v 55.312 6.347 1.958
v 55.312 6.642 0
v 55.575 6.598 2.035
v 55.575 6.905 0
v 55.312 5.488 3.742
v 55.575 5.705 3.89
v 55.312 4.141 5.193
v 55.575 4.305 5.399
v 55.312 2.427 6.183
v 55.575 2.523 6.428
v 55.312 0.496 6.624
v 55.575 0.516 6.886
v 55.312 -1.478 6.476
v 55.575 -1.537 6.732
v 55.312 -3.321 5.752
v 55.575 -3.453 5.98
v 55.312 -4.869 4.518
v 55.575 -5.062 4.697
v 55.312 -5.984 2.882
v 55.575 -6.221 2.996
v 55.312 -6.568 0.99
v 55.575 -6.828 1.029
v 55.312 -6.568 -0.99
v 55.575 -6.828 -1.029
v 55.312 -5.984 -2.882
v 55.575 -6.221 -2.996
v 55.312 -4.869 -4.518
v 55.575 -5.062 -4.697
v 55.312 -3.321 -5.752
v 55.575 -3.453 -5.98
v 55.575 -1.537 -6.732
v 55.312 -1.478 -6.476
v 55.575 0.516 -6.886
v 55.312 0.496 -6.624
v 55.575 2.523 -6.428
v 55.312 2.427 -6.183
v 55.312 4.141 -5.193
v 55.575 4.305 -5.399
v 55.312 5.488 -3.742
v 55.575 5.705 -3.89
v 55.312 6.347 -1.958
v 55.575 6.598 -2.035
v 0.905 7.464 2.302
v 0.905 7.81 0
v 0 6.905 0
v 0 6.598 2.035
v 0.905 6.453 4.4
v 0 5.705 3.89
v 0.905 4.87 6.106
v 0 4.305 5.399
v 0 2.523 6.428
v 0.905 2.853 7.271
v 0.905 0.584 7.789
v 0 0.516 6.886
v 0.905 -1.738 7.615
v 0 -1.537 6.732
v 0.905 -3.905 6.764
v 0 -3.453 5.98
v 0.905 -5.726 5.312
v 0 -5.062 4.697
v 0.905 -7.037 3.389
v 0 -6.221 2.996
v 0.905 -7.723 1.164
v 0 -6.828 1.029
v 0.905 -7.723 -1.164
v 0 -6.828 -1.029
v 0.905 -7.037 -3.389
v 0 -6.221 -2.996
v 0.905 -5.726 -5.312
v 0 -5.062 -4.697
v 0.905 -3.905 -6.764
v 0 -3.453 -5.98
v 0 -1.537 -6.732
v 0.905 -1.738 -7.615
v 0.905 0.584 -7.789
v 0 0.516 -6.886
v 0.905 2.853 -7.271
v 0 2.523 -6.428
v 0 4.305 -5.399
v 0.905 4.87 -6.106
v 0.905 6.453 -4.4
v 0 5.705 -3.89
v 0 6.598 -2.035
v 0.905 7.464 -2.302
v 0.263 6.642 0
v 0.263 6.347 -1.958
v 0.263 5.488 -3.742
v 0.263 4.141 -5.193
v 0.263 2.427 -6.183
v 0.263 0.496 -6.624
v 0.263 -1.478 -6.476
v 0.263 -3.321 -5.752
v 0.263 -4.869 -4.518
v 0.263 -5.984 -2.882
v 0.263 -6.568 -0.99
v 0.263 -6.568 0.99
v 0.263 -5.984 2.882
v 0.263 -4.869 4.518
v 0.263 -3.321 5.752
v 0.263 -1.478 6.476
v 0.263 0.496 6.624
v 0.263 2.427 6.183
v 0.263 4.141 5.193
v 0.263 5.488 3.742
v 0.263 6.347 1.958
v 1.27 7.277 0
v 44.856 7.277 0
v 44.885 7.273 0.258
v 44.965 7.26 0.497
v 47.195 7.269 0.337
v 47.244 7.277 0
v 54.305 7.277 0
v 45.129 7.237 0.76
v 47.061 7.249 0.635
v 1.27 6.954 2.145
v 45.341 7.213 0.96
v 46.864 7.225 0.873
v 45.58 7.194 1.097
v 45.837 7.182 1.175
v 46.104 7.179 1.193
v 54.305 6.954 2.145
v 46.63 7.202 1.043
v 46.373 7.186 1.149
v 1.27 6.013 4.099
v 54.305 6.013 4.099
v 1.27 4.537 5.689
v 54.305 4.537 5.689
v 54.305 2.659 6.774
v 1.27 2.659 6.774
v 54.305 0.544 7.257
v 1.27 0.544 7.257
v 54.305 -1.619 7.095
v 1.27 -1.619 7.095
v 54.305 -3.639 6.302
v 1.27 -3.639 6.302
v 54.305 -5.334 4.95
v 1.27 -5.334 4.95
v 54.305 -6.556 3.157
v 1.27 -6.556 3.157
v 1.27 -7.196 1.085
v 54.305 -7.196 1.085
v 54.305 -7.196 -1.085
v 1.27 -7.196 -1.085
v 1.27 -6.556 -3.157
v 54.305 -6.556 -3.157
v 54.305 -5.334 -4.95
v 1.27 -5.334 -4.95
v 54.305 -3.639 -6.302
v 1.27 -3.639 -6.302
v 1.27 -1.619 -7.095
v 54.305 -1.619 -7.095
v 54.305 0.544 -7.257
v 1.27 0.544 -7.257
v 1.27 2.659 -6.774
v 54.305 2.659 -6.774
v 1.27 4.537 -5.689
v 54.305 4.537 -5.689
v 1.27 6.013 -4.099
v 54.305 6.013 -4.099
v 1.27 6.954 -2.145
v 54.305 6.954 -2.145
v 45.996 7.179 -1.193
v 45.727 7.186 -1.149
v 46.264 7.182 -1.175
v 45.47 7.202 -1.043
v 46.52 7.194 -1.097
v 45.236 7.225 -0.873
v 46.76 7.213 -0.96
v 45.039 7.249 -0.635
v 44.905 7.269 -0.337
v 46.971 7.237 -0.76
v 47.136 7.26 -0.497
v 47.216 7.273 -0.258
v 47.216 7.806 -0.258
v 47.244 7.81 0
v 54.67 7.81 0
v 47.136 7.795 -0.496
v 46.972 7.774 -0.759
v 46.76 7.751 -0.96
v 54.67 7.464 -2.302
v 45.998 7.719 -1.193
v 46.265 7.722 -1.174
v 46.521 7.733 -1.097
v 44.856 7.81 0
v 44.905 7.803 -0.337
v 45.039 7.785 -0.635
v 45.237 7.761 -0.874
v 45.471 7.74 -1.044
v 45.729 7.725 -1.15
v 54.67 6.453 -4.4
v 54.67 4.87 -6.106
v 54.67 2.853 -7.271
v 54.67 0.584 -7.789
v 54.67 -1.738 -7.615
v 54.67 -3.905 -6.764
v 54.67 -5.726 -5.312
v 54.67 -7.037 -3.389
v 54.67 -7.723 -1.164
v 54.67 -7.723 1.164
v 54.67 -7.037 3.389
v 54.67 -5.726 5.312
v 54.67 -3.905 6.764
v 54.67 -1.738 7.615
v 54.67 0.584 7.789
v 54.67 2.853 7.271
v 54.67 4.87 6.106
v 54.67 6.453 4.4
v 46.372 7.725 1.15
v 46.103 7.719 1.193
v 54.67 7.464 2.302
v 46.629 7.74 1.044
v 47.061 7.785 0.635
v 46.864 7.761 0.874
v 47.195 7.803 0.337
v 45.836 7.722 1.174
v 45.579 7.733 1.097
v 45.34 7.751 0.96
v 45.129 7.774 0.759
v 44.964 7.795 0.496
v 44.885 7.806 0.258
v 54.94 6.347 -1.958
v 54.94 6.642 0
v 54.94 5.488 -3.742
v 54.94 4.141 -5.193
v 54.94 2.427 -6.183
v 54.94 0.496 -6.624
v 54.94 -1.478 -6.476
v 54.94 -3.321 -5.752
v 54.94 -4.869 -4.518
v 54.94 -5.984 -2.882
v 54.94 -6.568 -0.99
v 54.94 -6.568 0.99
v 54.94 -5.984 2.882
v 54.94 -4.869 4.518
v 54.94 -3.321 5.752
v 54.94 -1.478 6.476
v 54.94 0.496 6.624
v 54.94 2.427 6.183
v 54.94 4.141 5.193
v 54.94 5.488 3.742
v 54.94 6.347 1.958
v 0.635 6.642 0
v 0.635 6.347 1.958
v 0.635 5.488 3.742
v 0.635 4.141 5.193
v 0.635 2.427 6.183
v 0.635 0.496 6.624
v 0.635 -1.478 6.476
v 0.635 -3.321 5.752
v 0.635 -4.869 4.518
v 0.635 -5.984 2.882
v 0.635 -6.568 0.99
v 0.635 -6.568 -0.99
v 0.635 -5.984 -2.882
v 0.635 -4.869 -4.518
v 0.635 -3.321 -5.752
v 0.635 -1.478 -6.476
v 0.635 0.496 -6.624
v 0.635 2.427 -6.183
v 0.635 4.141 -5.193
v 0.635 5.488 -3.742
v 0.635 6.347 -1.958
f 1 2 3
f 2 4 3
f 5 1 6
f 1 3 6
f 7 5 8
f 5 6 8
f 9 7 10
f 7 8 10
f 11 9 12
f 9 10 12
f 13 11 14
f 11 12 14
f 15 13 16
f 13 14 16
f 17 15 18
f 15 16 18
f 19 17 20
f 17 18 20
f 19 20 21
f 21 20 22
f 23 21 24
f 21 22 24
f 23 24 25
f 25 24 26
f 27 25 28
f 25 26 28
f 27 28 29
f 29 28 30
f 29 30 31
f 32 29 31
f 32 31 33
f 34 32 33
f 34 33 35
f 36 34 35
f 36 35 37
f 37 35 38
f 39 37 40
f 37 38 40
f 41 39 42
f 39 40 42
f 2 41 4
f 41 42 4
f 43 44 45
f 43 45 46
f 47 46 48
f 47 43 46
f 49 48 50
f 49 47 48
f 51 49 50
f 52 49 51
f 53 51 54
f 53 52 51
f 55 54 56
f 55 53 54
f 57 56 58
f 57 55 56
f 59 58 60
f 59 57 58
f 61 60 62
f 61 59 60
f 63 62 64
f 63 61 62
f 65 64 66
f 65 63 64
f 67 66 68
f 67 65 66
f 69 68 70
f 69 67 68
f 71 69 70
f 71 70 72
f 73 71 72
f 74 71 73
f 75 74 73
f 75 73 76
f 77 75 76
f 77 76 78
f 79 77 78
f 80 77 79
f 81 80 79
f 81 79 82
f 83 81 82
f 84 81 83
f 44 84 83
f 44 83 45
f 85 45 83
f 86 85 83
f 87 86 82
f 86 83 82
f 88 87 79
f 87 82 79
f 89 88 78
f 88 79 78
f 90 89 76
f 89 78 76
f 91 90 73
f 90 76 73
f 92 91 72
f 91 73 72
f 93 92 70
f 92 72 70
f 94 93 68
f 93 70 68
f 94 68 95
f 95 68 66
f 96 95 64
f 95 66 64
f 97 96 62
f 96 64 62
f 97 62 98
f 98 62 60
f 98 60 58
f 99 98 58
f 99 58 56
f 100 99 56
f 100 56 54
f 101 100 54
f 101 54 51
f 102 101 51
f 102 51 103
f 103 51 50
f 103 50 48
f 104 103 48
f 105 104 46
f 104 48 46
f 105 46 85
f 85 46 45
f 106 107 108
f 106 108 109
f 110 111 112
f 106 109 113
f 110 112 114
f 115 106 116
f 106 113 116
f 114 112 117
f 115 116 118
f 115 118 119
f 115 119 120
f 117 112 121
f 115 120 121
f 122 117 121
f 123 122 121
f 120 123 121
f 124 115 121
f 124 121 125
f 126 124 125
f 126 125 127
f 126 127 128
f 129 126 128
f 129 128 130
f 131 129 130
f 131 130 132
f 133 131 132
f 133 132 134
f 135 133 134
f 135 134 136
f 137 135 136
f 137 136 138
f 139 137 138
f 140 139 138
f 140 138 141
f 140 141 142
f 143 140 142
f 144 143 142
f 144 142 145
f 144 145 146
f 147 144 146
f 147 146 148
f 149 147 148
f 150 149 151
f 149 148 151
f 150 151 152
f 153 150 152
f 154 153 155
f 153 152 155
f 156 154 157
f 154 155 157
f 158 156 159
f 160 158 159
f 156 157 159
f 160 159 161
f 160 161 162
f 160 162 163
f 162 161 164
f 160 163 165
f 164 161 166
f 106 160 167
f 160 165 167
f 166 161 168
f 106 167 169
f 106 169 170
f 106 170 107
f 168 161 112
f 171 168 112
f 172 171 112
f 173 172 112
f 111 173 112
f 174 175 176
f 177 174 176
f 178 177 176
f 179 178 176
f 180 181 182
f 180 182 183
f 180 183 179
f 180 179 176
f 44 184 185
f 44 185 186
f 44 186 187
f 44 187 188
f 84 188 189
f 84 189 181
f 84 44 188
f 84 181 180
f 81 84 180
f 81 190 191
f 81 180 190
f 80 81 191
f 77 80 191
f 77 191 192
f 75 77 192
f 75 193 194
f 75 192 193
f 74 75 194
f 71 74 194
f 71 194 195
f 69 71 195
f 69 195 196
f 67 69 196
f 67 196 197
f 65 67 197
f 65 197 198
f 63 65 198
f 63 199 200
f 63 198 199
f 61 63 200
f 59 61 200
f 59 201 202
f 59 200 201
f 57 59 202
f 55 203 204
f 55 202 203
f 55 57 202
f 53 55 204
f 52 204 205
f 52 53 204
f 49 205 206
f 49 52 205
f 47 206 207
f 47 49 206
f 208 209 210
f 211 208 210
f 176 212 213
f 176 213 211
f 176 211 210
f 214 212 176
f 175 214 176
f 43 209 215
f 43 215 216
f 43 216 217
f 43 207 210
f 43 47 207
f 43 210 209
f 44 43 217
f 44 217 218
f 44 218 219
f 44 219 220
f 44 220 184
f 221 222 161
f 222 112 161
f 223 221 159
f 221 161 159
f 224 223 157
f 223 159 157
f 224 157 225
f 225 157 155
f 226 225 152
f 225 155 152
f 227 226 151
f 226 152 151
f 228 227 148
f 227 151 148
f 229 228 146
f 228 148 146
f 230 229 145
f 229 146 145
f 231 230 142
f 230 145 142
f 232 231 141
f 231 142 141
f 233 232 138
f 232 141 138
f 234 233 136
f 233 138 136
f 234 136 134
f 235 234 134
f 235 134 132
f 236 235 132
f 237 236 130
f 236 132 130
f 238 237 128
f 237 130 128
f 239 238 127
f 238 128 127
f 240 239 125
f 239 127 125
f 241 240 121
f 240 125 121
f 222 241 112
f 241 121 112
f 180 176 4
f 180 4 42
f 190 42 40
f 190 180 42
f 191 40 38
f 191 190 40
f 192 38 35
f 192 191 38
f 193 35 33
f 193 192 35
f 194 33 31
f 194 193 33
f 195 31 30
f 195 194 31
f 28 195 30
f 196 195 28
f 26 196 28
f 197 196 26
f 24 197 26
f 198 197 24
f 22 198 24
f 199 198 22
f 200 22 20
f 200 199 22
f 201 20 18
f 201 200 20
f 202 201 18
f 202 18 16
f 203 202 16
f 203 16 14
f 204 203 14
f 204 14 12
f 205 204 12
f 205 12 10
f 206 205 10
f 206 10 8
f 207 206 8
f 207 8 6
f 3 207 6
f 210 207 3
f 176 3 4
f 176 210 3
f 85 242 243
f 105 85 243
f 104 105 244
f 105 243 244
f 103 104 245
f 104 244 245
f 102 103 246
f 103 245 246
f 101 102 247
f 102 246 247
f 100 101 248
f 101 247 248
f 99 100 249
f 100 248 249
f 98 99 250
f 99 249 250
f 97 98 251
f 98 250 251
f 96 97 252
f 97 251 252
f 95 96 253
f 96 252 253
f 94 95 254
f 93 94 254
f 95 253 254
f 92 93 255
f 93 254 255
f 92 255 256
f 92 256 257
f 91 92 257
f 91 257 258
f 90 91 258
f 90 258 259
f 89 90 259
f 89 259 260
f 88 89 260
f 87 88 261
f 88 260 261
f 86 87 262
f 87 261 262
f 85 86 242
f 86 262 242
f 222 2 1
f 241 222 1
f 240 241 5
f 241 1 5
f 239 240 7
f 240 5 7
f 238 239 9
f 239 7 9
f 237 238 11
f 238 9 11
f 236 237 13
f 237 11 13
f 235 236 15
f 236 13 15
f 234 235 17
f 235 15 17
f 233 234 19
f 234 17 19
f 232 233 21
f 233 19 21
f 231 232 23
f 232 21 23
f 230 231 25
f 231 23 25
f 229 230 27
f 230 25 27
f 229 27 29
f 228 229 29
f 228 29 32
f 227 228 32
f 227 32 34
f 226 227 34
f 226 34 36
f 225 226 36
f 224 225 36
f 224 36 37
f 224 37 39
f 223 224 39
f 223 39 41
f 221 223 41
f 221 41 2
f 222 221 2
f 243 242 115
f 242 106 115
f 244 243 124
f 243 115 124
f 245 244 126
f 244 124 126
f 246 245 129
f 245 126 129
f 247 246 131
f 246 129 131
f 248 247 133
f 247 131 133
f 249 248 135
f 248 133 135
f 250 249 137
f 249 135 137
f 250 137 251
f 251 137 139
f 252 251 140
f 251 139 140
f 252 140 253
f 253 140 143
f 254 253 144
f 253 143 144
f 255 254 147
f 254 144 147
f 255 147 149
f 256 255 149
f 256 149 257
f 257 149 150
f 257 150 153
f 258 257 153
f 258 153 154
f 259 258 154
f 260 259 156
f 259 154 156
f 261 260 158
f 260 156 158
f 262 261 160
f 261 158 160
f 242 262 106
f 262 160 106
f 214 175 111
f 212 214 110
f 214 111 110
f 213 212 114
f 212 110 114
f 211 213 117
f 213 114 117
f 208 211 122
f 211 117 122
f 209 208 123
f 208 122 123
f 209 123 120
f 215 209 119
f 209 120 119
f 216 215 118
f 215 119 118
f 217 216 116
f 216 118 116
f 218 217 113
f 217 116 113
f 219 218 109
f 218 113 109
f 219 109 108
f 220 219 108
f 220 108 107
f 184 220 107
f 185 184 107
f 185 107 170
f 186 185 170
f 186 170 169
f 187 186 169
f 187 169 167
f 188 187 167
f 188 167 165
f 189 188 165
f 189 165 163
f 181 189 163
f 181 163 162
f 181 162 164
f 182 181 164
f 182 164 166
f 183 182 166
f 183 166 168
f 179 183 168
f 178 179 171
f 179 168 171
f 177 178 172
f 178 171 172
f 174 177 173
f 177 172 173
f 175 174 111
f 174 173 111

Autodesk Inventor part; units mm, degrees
sketch "Sketch_5" plane through (0, 0, 0) normal (0, 0, 1) x (1, 0, 0)
  line L0 (55.5752, 0) -> (-55.5752, 0)
  line L1 (0, 6.9051) -> (0.263, 6.6421)
  line L2 (0.263, 6.6421) -> (0.635, 6.6421)
  line L3 (0.635, 6.6421) -> (1.27, 7.2771)
  line L4 (1.27, 7.2771) -> (54.3052, 7.2771)
  line L5 (54.3052, 7.2771) -> (54.9402, 6.6421)
  line L6 (54.9402, 6.6421) -> (55.3122, 6.6421)
  line L7 (55.3122, 6.6421) -> (55.5752, 6.9051)
  line L8 (55.5752, 6.9051) -> (54.6698, 7.8105)
  line L9 (54.6698, 7.8105) -> (0.9054, 7.8105)
  line L10 (0.9054, 7.8105) -> (0, 6.9051)
revolve "Revolution1" add sketch "Sketch_5" angle 360 about axis through (55.5752, 0, 0) along (1, 0, 0)
sketch "Sketch_1" plane through (0, 0, 0) normal (0, 0, 1) x (1, 0, 0)
  line L0 (46.0502, 0) -> (46.0502, 7.8105)
  line L1 (46.0502, 7.8105) -> (47.244, 7.8105)
  line L2 (47.244, 7.8105) -> (47.244, 0)
  line L3 (47.244, 0) -> (46.0502, 0)
  line L4 (46.0502, 0) -> (46.0502, 7.8105)
revolve "Revolution2" cut sketch "Sketch_1" angle 360 about axis through (46.0502, 0, 0) along (0, -1, 0)
ref_plane "o1_XY" through (0, -7.8105, 0) normal (1, 0, 0) x (0, 0, -1)
ref_plane "o1_YZ" through (0, -7.8105, 0) normal (0, 0, -1) x (0, 1, 0)
ref_plane "o1_ZX" through (0, -7.8105, 0) normal (0, 1, 0) x (1, 0, 0)
ref_plane "o2_XY" through (0, 7.8105, 0) normal (1, 0, 0) x (0, 0, -1)
ref_plane "o2_YZ" through (0, 7.8105, 0) normal (0, 0, -1) x (0, 1, 0)
ref_plane "o2_ZX" through (0, 7.8105, 0) normal (0, 1, 0) x (1, 0, 0)
ref_plane "t1_XY" through (27.7876, 7.8105, 0) normal (1, 0, 0) x (0, 0, -1)
ref_plane "t1_YZ" through (27.7876, 7.8105, 0) normal (0, 0, -1) x (0, 1, 0)
ref_plane "t1_ZX" through (27.7876, 7.8105, 0) normal (0, 1, 0) x (1, 0, 0)
ref_plane "t2_XY" through (27.7876, 0, -7.8105) normal (1, 0, 0) x (0, 0, -1)
ref_plane "t2_YZ" through (27.7876, 0, -7.8105) normal (0, 0, -1) x (0, 1, 0)
ref_plane "t2_ZX" through (27.7876, 0, -7.8105) normal (0, 1, 0) x (1, 0, 0)
ref_plane "t3_XY" through (27.7876, -7.8105, 0) normal (1, 0, 0) x (0, 0, -1)
ref_plane "t3_YZ" through (27.7876, -7.8105, 0) normal (0, 0, -1) x (0, 1, 0)
ref_plane "t3_ZX" through (27.7876, -7.8105, 0) normal (0, 1, 0) x (1, 0, 0)
ref_plane "t4_XY" through (27.7876, 0, 7.8105) normal (1, 0, 0) x (0, 0, -1)
ref_plane "t4_YZ" through (27.7876, 0, 7.8105) normal (0, 0, -1) x (0, 1, 0)
ref_plane "t4_ZX" through (27.7876, 0, 7.8105) normal (0, 1, 0) x (1, 0, 0)
ref_plane "tube1_XY" through (1.27, 0, 0) normal (1, 0, 0) x (0, 0, -1)
ref_plane "tube1_YZ" through (1.27, 0, 0) normal (0, 0, -1) x (0, 1, 0)
ref_plane "tube1_ZX" through (1.27, 0, 0) normal (0, 1, 0) x (1, 0, 0)
ref_plane "tube2_XY" through (54.3052, 0, 0) normal (1, 0, 0) x (0, 0, -1)
ref_plane "tube2_YZ" through (54.3052, 0, 0) normal (0, 0, -1) x (0, 1, 0)
ref_plane "tube2_ZX" through (54.3052, 0, 0) normal (0, 1, 0) x (1, 0, 0)
properties part number "D-75938XP-2.188" material "Steel"
